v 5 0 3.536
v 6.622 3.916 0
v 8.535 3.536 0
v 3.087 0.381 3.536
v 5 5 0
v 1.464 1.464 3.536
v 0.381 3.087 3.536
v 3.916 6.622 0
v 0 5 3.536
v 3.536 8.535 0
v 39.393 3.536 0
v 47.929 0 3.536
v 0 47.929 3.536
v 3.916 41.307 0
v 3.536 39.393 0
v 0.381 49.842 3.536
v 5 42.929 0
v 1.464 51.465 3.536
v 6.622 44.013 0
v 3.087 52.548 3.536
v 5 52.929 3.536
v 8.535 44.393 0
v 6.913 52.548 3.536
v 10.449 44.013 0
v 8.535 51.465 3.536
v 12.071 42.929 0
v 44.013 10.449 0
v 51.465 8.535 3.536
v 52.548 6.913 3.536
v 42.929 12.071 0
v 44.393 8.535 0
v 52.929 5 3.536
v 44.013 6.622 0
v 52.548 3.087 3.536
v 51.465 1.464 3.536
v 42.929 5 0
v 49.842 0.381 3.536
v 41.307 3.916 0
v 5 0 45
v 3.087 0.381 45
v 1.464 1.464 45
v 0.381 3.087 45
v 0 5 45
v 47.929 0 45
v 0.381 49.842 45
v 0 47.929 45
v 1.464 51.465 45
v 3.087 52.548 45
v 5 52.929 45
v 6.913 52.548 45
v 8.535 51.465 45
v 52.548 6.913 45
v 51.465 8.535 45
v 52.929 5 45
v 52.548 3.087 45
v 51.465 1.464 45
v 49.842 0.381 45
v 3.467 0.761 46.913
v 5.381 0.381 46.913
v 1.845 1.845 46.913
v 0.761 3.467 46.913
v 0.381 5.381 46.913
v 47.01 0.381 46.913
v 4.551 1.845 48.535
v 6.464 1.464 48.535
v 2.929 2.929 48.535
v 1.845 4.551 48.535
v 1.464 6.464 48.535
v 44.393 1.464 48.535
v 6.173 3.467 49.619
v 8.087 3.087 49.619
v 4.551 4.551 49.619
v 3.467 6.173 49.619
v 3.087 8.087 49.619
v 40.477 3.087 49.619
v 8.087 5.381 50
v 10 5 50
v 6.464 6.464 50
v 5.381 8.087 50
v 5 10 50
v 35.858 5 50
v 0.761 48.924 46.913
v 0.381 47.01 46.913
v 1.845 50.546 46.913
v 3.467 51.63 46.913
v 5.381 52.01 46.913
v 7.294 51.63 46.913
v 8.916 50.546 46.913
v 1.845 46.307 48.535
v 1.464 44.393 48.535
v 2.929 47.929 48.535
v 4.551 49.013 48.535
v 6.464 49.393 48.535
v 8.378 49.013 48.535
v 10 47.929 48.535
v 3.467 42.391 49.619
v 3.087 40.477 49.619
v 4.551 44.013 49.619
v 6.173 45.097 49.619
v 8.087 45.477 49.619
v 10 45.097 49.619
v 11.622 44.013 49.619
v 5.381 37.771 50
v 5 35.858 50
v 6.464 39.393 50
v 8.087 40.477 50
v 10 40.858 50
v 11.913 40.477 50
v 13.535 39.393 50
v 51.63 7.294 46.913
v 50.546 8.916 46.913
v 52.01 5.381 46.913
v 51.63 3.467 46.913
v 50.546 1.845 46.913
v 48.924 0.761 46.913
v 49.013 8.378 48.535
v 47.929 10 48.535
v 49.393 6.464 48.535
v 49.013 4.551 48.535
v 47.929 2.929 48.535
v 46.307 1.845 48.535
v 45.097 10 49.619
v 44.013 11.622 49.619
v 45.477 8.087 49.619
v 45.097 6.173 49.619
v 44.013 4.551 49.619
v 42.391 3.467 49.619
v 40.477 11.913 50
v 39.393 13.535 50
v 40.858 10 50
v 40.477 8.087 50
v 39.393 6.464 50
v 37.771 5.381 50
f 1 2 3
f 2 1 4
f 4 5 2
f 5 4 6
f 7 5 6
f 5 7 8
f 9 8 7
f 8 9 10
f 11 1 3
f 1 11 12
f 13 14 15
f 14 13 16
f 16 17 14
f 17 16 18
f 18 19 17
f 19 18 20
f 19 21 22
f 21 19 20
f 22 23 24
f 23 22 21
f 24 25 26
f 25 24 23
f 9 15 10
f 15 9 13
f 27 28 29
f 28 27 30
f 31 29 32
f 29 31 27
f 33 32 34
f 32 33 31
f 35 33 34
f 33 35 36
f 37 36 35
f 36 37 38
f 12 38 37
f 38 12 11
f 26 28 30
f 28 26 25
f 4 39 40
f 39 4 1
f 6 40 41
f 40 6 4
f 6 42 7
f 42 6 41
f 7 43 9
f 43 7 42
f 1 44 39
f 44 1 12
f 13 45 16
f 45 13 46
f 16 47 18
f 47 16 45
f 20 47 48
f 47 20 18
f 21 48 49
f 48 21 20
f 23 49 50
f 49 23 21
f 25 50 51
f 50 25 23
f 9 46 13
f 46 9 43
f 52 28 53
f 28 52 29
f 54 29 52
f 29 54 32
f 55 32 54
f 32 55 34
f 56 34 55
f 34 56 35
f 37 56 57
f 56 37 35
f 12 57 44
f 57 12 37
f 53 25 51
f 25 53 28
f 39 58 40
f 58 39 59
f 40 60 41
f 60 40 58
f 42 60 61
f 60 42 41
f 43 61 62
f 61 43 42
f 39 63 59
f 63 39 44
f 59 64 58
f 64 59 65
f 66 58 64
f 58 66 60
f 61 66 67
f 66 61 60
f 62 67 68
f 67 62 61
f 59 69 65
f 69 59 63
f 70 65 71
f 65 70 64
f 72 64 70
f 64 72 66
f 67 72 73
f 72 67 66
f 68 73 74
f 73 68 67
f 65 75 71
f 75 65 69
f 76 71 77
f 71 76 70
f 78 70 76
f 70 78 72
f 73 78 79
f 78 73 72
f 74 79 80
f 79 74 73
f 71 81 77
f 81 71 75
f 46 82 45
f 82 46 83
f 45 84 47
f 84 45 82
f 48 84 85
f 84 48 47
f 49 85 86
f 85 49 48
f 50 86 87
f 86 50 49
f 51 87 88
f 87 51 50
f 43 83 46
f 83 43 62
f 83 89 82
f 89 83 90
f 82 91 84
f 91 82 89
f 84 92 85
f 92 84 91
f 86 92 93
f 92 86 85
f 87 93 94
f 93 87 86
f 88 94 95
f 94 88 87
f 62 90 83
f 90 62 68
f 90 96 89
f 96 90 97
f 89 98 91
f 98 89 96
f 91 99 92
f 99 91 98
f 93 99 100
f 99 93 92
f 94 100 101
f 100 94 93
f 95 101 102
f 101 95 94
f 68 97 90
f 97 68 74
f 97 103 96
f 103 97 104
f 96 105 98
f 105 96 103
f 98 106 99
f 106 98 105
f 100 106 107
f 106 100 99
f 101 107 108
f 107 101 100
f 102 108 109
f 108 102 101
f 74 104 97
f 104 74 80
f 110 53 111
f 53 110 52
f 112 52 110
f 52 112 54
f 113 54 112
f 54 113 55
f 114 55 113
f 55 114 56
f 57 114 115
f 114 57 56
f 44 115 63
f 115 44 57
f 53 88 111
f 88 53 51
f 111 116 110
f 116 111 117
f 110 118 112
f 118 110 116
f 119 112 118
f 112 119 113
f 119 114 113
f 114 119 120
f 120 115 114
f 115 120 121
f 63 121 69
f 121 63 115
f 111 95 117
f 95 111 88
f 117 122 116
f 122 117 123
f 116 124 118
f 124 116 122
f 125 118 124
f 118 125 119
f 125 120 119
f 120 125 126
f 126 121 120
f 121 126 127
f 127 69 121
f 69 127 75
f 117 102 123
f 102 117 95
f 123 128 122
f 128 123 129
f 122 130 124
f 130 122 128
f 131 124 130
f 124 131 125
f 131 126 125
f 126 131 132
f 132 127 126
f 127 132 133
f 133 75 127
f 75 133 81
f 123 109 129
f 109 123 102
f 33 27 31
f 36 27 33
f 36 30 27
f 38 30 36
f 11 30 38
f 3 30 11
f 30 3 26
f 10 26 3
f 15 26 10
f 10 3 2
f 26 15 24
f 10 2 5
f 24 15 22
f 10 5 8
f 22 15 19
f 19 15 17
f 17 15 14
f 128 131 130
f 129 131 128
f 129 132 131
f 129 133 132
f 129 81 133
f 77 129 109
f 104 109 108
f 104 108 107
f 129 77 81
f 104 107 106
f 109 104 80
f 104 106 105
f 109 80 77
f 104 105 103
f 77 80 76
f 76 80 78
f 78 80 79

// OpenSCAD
// Unit of length: Unit.MM
polyhedron(points = [[8.5355, 3.5355, 0.0], [5.0, 0.0, 3.5355], [5.0, 0.0, 3.5355], [8.5355, 3.5355, 0.0], [6.6221, 3.9161, 0.0], [3.0866, 0.3806, 3.5355], [5.0, 5.0, 0.0], [1.4645, 1.4645, 3.5355], [3.9161, 6.6221, 0.0], [0.3806, 3.0866, 3.5355], [3.5355, 8.5355, 0.0], [0.0, 5.0, 3.5355], [3.5355, 8.5355, 0.0], [0.0, 5.0, 3.5355], [47.9289, 0.0, 3.5355], [39.3934, 3.5355, 0.0], [3.5355, 39.3934, 0.0], [0.0, 47.9289, 3.5355], [0.0, 47.9289, 3.5355], [3.5355, 39.3934, 0.0], [3.9161, 41.3068, 0.0], [0.3806, 49.8423, 3.5355], [5.0, 42.9289, 0.0], [1.4645, 51.4645, 3.5355], [6.6221, 44.0128, 0.0], [3.0866, 52.5483, 3.5355], [8.5355, 44.3934, 0.0], [5.0, 52.9289, 3.5355], [10.449, 44.0128, 0.0], [6.9134, 52.5483, 3.5355], [12.0711, 42.9289, 0.0], [8.5355, 51.4645, 3.5355], [12.0711, 42.9289, 0.0], [8.5355, 51.4645, 3.5355], [42.9289, 12.0711, 0.0], [51.4645, 8.5355, 3.5355], [51.4645, 8.5355, 3.5355], [42.9289, 12.0711, 0.0], [44.0128, 10.449, 0.0], [52.5483, 6.9134, 3.5355], [44.3934, 8.5355, 0.0], [52.9289, 5.0, 3.5355], [44.0128, 6.6221, 0.0], [52.5483, 3.0866, 3.5355], [42.9289, 5.0, 0.0], [51.4645, 1.4645, 3.5355], [41.3068, 3.9161, 0.0], [49.8423, 0.3806, 3.5355], [39.3934, 3.5355, 0.0], [47.9289, 0.0, 3.5355], [5.0, 0.0, 45.0], [5.0, 0.0, 45.0], [3.0866, 0.3806, 45.0], [1.4645, 1.4645, 45.0], [0.3806, 3.0866, 45.0], [0.0, 5.0, 45.0], [0.0, 5.0, 45.0], [47.9289, 0.0, 45.0], [0.0, 47.9289, 45.0], [0.0, 47.9289, 45.0], [0.3806, 49.8423, 45.0], [1.4645, 51.4645, 45.0], [3.0866, 52.5483, 45.0], [5.0, 52.9289, 45.0], [6.9134, 52.5483, 45.0], [8.5355, 51.4645, 45.0], [8.5355, 51.4645, 45.0], [51.4645, 8.5355, 45.0], [51.4645, 8.5355, 45.0], [52.5483, 6.9134, 45.0], [52.9289, 5.0, 45.0], [52.5483, 3.0866, 45.0], [51.4645, 1.4645, 45.0], [49.8423, 0.3806, 45.0], [47.9289, 0.0, 45.0], [5.0, 0.0, 45.0], [5.0, 0.0, 45.0], [3.0866, 0.3806, 45.0], [1.4645, 1.4645, 45.0], [0.3806, 3.0866, 45.0], [0.0, 5.0, 45.0], [0.0, 5.0, 45.0], [47.9289, 0.0, 45.0], [5.3806, 0.3806, 46.9134], [5.3806, 0.3806, 46.9134], [3.4672, 0.7612, 46.9134], [1.8451, 1.8451, 46.9134], [0.7612, 3.4672, 46.9134], [0.3806, 5.3806, 46.9134], [0.3806, 5.3806, 46.9134], [47.0101, 0.3806, 46.9134], [6.4645, 1.4645, 48.5355], [6.4645, 1.4645, 48.5355], [4.551, 1.8451, 48.5355], [2.9289, 2.9289, 48.5355], [1.8451, 4.551, 48.5355], [1.4645, 6.4645, 48.5355], [1.4645, 6.4645, 48.5355], [44.3934, 1.4645, 48.5355], [8.0866, 3.0866, 49.6194], [8.0866, 3.0866, 49.6194], [6.1732, 3.4672, 49.6194], [4.551, 4.551, 49.6194], [3.4672, 6.1732, 49.6194], [3.0866, 8.0866, 49.6194], [3.0866, 8.0866, 49.6194], [40.4773, 3.0866, 49.6194], [10.0, 5.0, 50.0], [10.0, 5.0, 50.0], [8.0866, 5.3806, 50.0], [6.4645, 6.4645, 50.0], [5.3806, 8.0866, 50.0], [5.0, 10.0, 50.0], [5.0, 10.0, 50.0], [35.8579, 5.0, 50.0], [10.0, 5.0, 50.0], [10.0, 5.0, 50.0], [8.0866, 5.3806, 50.0], [6.4645, 6.4645, 50.0], [5.3806, 8.0866, 50.0], [5.0, 10.0, 50.0], [5.0, 10.0, 50.0], [35.8579, 5.0, 50.0], [0.0, 47.9289, 45.0], [0.0, 47.9289, 45.0], [0.3806, 49.8423, 45.0], [1.4645, 51.4645, 45.0], [3.0866, 52.5483, 45.0], [5.0, 52.9289, 45.0], [6.9134, 52.5483, 45.0], [8.5355, 51.4645, 45.0], [8.5355, 51.4645, 45.0], [0.3806, 47.0101, 46.9134], [0.3806, 47.0101, 46.9134], [0.7612, 48.9235, 46.9134], [1.8451, 50.5456, 46.9134], [3.4672, 51.6295, 46.9134], [5.3806, 52.0101, 46.9134], [7.294, 51.6295, 46.9134], [8.9161, 50.5456, 46.9134], [8.9161, 50.5456, 46.9134], [1.4645, 44.3934, 48.5355], [1.4645, 44.3934, 48.5355], [1.8451, 46.3068, 48.5355], [2.9289, 47.9289, 48.5355], [4.551, 49.0128, 48.5355], [6.4645, 49.3934, 48.5355], [8.3779, 49.0128, 48.5355], [10.0, 47.9289, 48.5355], [10.0, 47.9289, 48.5355], [3.0866, 40.4773, 49.6194], [3.0866, 40.4773, 49.6194], [3.4672, 42.3907, 49.6194], [4.551, 44.0128, 49.6194], [6.1732, 45.0967, 49.6194], [8.0866, 45.4773, 49.6194], [10.0, 45.0967, 49.6194], [11.6221, 44.0128, 49.6194], [11.6221, 44.0128, 49.6194], [5.0, 35.8579, 50.0], [5.0, 35.8579, 50.0], [5.3806, 37.7713, 50.0], [6.4645, 39.3934, 50.0], [8.0866, 40.4773, 50.0], [10.0, 40.8579, 50.0], [11.9134, 40.4773, 50.0], [13.5355, 39.3934, 50.0], [13.5355, 39.3934, 50.0], [5.0, 35.8579, 50.0], [5.0, 35.8579, 50.0], [5.3806, 37.7713, 50.0], [6.4645, 39.3934, 50.0], [8.0866, 40.4773, 50.0], [10.0, 40.8579, 50.0], [11.9134, 40.4773, 50.0], [13.5355, 39.3934, 50.0], [13.5355, 39.3934, 50.0], [51.4645, 8.5355, 45.0], [51.4645, 8.5355, 45.0], [52.5483, 6.9134, 45.0], [52.9289, 5.0, 45.0], [52.5483, 3.0866, 45.0], [51.4645, 1.4645, 45.0], [49.8423, 0.3806, 45.0], [47.9289, 0.0, 45.0], [50.5456, 8.9161, 46.9134], [50.5456, 8.9161, 46.9134], [51.6295, 7.294, 46.9134], [52.0101, 5.3806, 46.9134], [51.6295, 3.4672, 46.9134], [50.5456, 1.8451, 46.9134], [48.9235, 0.7612, 46.9134], [47.0101, 0.3806, 46.9134], [47.9289, 10.0, 48.5355], [47.9289, 10.0, 48.5355], [49.0128, 8.3779, 48.5355], [49.3934, 6.4645, 48.5355], [49.0128, 4.551, 48.5355], [47.9289, 2.9289, 48.5355], [46.3068, 1.8451, 48.5355], [44.3934, 1.4645, 48.5355], [44.0128, 11.6221, 49.6194], [44.0128, 11.6221, 49.6194], [45.0967, 10.0, 49.6194], [45.4773, 8.0866, 49.6194], [45.0967, 6.1732, 49.6194], [44.0128, 4.551, 49.6194], [42.3907, 3.4672, 49.6194], [40.4773, 3.0866, 49.6194], [39.3934, 13.5355, 50.0], [39.3934, 13.5355, 50.0], [40.4773, 11.9134, 50.0], [40.8579, 10.0, 50.0], [40.4773, 8.0866, 50.0], [39.3934, 6.4645, 50.0], [37.7713, 5.3806, 50.0], [35.8579, 5.0, 50.0], [39.3934, 13.5355, 50.0], [39.3934, 13.5355, 50.0], [40.4773, 11.9134, 50.0], [40.8579, 10.0, 50.0], [40.4773, 8.0866, 50.0], [39.3934, 6.4645, 50.0], [37.7713, 5.3806, 50.0], [35.8579, 5.0, 50.0]], faces = [[0, 1, 2, 3], [4, 5, 1, 0], [6, 7, 5, 4], [8, 9, 7, 6], [10, 11, 9, 8], [12, 13, 11, 10], [3, 2, 14, 15], [16, 17, 18, 19], [20, 21, 17, 16], [22, 23, 21, 20], [24, 25, 23, 22], [26, 27, 25, 24], [28, 29, 27, 26], [30, 31, 29, 28], [32, 33, 31, 30], [19, 18, 13, 12], [34, 35, 36, 37], [38, 39, 35, 34], [40, 41, 39, 38], [42, 43, 41, 40], [44, 45, 43, 42], [46, 47, 45, 44], [48, 49, 47, 46], [15, 14, 49, 48], [37, 36, 33, 32], [1, 50, 51, 2], [5, 52, 50, 1], [7, 53, 52, 5], [9, 54, 53, 7], [11, 55, 54, 9], [13, 56, 55, 11], [2, 51, 57, 14], [17, 58, 59, 18], [21, 60, 58, 17], [23, 61, 60, 21], [25, 62, 61, 23], [27, 63, 62, 25], [29, 64, 63, 27], [31, 65, 64, 29], [33, 66, 65, 31], [18, 59, 56, 13], [35, 67, 68, 36], [39, 69, 67, 35], [41, 70, 69, 39], [43, 71, 70, 41], [45, 72, 71, 43], [47, 73, 72, 45], [49, 74, 73, 47], [14, 57, 74, 49], [36, 68, 66, 33], [50, 75, 76, 51], [52, 77, 75, 50], [53, 78, 77, 52], [54, 79, 78, 53], [55, 80, 79, 54], [56, 81, 80, 55], [51, 76, 82, 57], [75, 83, 84, 76], [77, 85, 83, 75], [78, 86, 85, 77], [79, 87, 86, 78], [80, 88, 87, 79], [81, 89, 88, 80], [76, 84, 90, 82], [83, 91, 92, 84], [85, 93, 91, 83], [86, 94, 93, 85], [87, 95, 94, 86], [88, 96, 95, 87], [89, 97, 96, 88], [84, 92, 98, 90], [91, 99, 100, 92], [93, 101, 99, 91], [94, 102, 101, 93], [95, 103, 102, 94], [96, 104, 103, 95], [97, 105, 104, 96], [92, 100, 106, 98], [99, 107, 108, 100], [101, 109, 107, 99], [102, 110, 109, 101], [103, 111, 110, 102], [104, 112, 111, 103], [105, 113, 112, 104], [100, 108, 114, 106], [107, 115, 116, 108], [109, 117, 115, 107], [110, 118, 117, 109], [111, 119, 118, 110], [112, 120, 119, 111], [113, 121, 120, 112], [108, 116, 122, 114], [58, 123, 124, 59], [60, 125, 123, 58], [61, 126, 125, 60], [62, 127, 126, 61], [63, 128, 127, 62], [64, 129, 128, 63], [65, 130, 129, 64], [66, 131, 130, 65], [59, 124, 81, 56], [123, 132, 133, 124], [125, 134, 132, 123], [126, 135, 134, 125], [127, 136, 135, 126], [128, 137, 136, 127], [129, 138, 137, 128], [130, 139, 138, 129], [131, 140, 139, 130], [124, 133, 89, 81], [132, 141, 142, 133], [134, 143, 141, 132], [135, 144, 143, 134], [136, 145, 144, 135], [137, 146, 145, 136], [138, 147, 146, 137], [139, 148, 147, 138], [140, 149, 148, 139], [133, 142, 97, 89], [141, 150, 151, 142], [143, 152, 150, 141], [144, 153, 152, 143], [145, 154, 153, 144], [146, 155, 154, 145], [147, 156, 155, 146], [148, 157, 156, 147], [149, 158, 157, 148], [142, 151, 105, 97], [150, 159, 160, 151], [152, 161, 159, 150], [153, 162, 161, 152], [154, 163, 162, 153], [155, 164, 163, 154], [156, 165, 164, 155], [157, 166, 165, 156], [158, 167, 166, 157], [151, 160, 113, 105], [159, 168, 169, 160], [161, 170, 168, 159], [162, 171, 170, 161], [163, 172, 171, 162], [164, 173, 172, 163], [165, 174, 173, 164], [166, 175, 174, 165], [167, 176, 175, 166], [160, 169, 121, 113], [67, 177, 178, 68], [69, 179, 177, 67], [70, 180, 179, 69], [71, 181, 180, 70], [72, 182, 181, 71], [73, 183, 182, 72], [74, 184, 183, 73], [57, 82, 184, 74], [68, 178, 131, 66], [177, 185, 186, 178], [179, 187, 185, 177], [180, 188, 187, 179], [181, 189, 188, 180], [182, 190, 189, 181], [183, 191, 190, 182], [184, 192, 191, 183], [82, 90, 192, 184], [178, 186, 140, 131], [185, 193, 194, 186], [187, 195, 193, 185], [188, 196, 195, 187], [189, 197, 196, 188], [190, 198, 197, 189], [191, 199, 198, 190], [192, 200, 199, 191], [90, 98, 200, 192], [186, 194, 149, 140], [193, 201, 202, 194], [195, 203, 201, 193], [196, 204, 203, 195], [197, 205, 204, 196], [198, 206, 205, 197], [199, 207, 206, 198], [200, 208, 207, 199], [98, 106, 208, 200], [194, 202, 158, 149], [201, 209, 210, 202], [203, 211, 209, 201], [204, 212, 211, 203], [205, 213, 212, 204], [206, 214, 213, 205], [207, 215, 214, 206], [208, 216, 215, 207], [106, 114, 216, 208], [202, 210, 167, 158], [209, 217, 218, 210], [211, 219, 217, 209], [212, 220, 219, 211], [213, 221, 220, 212], [214, 222, 221, 213], [215, 223, 222, 214], [216, 224, 223, 215], [114, 122, 224, 216], [210, 218, 176, 167], [15, 48, 46, 44, 42, 40, 38, 34, 37, 32, 30, 28, 26, 24, 22, 20, 16, 19, 12, 10, 8, 6, 4, 0, 3], [116, 115, 117, 118, 119, 120, 121, 169, 168, 170, 171, 172, 173, 174, 175, 176, 218, 217, 219, 220, 221, 222, 223, 224, 122]]);
